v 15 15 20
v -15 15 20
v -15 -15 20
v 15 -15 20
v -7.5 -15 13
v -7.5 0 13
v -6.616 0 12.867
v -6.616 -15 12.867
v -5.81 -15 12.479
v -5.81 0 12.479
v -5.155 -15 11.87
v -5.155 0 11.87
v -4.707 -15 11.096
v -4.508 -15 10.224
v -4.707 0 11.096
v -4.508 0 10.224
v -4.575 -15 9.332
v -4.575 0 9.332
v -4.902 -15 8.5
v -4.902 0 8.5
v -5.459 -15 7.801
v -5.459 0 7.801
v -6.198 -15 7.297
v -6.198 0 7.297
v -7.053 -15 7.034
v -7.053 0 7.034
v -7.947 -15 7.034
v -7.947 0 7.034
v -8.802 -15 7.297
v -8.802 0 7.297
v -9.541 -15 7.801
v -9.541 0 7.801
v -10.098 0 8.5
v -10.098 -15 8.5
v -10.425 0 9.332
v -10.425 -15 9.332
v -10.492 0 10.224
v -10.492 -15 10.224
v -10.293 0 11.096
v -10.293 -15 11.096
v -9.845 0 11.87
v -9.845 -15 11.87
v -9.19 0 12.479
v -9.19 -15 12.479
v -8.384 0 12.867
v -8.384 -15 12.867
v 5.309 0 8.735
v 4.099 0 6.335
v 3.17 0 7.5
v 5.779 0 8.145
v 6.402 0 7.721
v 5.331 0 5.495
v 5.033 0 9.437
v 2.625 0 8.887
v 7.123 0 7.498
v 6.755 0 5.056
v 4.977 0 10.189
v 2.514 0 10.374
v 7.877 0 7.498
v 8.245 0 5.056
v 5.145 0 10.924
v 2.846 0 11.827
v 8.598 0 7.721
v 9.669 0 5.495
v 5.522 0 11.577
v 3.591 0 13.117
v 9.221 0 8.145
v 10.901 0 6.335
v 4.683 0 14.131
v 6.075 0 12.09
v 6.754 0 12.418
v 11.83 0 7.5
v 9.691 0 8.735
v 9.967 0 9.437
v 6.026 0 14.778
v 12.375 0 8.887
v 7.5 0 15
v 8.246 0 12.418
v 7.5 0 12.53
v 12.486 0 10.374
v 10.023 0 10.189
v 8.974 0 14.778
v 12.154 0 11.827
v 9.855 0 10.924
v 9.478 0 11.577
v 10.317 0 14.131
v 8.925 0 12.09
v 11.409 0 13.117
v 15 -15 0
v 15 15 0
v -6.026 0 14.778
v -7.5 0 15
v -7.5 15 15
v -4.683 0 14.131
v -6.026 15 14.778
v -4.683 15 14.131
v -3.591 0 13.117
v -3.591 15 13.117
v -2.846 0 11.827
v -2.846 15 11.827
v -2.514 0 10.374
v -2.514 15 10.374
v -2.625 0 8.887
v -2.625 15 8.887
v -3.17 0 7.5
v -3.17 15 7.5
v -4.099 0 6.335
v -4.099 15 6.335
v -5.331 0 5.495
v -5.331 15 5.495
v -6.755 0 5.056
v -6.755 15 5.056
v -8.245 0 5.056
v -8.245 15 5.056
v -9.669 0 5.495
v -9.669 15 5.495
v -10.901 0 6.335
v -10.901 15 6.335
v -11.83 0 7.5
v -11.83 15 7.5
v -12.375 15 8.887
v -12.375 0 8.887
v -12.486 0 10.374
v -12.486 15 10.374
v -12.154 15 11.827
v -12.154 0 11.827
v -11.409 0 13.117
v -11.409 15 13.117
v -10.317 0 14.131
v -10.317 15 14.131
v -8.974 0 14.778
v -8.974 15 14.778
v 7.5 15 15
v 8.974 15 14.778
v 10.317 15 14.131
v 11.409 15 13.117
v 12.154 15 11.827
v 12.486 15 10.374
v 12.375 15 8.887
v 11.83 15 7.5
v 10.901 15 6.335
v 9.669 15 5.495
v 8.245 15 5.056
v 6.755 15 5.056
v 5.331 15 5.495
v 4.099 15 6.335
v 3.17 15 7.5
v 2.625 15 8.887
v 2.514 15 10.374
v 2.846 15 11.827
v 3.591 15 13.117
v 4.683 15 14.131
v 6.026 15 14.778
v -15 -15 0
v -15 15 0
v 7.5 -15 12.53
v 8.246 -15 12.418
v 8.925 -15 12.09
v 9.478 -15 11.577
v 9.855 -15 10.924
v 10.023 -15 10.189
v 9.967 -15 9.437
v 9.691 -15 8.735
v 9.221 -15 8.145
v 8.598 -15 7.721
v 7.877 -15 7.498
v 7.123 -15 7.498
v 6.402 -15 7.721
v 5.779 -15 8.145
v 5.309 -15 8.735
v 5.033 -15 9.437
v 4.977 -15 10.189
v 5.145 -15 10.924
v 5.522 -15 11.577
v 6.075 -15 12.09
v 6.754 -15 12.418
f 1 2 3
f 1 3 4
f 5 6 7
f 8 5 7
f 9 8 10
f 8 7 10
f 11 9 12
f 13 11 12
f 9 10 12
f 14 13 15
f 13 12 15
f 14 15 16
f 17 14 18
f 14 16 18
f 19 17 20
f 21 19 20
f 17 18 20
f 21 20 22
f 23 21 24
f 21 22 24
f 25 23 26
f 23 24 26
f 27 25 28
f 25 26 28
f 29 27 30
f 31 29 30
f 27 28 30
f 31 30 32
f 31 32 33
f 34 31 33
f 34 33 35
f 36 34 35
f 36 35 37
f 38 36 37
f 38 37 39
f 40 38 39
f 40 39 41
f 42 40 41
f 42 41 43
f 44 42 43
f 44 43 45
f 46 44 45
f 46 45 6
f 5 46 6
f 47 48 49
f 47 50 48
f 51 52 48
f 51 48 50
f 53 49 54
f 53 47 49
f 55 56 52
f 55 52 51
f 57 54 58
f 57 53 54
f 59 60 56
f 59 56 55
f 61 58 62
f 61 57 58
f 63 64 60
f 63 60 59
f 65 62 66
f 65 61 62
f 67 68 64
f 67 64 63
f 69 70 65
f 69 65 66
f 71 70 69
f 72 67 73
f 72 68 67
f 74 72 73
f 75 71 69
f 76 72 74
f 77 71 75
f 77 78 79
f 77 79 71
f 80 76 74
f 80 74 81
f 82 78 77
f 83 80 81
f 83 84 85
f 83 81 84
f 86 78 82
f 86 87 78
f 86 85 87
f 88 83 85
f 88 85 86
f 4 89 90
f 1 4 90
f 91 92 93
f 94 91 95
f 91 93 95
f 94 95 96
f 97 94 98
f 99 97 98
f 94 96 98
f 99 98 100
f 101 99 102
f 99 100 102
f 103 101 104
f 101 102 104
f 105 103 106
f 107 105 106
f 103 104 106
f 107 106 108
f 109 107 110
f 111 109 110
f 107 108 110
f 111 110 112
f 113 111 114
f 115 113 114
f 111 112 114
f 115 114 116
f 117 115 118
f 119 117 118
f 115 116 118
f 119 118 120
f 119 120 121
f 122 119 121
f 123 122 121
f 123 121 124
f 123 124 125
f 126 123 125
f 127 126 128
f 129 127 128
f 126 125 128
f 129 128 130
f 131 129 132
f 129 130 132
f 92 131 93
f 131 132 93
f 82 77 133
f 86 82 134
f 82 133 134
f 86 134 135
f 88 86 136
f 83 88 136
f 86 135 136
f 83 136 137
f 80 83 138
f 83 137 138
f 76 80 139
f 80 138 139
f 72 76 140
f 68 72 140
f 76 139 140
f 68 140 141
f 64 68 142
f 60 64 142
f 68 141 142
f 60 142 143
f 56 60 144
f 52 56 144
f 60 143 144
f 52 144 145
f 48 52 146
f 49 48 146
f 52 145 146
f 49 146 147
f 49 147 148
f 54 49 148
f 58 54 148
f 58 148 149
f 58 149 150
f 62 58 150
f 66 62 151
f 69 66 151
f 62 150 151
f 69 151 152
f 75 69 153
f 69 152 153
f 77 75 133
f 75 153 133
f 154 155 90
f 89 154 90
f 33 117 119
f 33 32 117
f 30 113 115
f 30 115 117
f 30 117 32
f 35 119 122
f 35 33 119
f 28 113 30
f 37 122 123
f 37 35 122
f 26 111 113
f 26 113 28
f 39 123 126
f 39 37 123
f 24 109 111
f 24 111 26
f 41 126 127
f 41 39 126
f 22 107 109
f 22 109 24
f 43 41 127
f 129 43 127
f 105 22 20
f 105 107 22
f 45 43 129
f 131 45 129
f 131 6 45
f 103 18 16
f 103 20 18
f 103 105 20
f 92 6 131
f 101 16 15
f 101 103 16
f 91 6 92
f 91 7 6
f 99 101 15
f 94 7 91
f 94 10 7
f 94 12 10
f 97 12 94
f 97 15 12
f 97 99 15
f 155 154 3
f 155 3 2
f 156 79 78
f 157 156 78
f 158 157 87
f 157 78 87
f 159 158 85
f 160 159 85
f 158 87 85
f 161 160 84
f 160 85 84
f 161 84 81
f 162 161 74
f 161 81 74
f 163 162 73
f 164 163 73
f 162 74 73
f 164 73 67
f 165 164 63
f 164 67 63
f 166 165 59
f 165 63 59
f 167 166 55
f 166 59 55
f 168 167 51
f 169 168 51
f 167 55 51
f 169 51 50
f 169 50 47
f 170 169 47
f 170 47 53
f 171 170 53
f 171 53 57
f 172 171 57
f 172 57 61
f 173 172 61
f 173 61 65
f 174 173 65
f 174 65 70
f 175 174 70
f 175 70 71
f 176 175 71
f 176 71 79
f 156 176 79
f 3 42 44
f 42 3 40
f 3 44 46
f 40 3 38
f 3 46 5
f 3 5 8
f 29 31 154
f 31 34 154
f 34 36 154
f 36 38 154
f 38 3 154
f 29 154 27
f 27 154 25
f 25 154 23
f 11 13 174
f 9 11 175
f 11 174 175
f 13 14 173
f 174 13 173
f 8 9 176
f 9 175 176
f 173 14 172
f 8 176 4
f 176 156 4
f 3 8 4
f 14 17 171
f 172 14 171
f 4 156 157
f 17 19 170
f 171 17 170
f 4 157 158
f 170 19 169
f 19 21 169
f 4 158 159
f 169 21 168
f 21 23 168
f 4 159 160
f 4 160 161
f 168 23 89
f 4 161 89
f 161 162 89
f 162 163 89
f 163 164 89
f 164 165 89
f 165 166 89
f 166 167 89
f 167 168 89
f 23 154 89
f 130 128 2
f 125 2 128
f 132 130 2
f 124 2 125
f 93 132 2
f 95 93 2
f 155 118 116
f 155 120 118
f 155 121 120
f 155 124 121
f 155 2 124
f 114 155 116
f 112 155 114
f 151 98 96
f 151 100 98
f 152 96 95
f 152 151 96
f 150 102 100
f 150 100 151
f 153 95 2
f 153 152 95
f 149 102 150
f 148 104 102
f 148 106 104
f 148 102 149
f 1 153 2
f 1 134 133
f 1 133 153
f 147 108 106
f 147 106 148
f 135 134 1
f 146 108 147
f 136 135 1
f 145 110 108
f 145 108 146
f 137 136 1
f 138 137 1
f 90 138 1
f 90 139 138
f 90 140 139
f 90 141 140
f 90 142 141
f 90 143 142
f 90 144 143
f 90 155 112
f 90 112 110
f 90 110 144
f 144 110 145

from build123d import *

# Parameters (mm, degrees)
SKETCH1_W           = 30
SKETCH1_H           = 30
BOSS_EXTRUDE1_DEPTH = 20
SKETCH2_R           = 3
SKETCH2_R_2         = 2.53
CUT_EXTRUDE1_DEPTH  = 40.05124838
SKETCH3_R           = 5
CUT_EXTRUDE2_DEPTH  = 15


with BuildPart() as part:
    # Sketch1 → Boss-Extrude1 (new body)
    with BuildSketch(Plane.XY):
        Rectangle(SKETCH1_W, SKETCH1_H)
    extrude(amount=BOSS_EXTRUDE1_DEPTH)

    # Sketch2 → Cut-Extrude1 (cut, through all)
    with BuildSketch(Plane(origin=(0, 15, 0), x_dir=(1, 0, 0), z_dir=(0, 1, 0))):
        with Locations(Location((-7.5, -10, 0), (0, 0, 270))):
            Circle(SKETCH2_R)
        with Locations(Location((7.5, -10, 0), (0, 0, 270))):
            Circle(SKETCH2_R_2)
    extrude(amount=-CUT_EXTRUDE1_DEPTH, mode=Mode.SUBTRACT)

    # Sketch3 → Cut-Extrude2 (cut)
    with BuildSketch(Plane(origin=(0, 15, 0), x_dir=(1, 0, 0), z_dir=(0, 1, 0))):
        with Locations(Location((-7.5, -10, 0), (0, 0, 270))):
            Circle(SKETCH3_R)
        with Locations(Location((7.5, -10, 0), (0, 0, 270))):
            Circle(SKETCH3_R)
    extrude(amount=-CUT_EXTRUDE2_DEPTH, mode=Mode.SUBTRACT)


solid = part.part
